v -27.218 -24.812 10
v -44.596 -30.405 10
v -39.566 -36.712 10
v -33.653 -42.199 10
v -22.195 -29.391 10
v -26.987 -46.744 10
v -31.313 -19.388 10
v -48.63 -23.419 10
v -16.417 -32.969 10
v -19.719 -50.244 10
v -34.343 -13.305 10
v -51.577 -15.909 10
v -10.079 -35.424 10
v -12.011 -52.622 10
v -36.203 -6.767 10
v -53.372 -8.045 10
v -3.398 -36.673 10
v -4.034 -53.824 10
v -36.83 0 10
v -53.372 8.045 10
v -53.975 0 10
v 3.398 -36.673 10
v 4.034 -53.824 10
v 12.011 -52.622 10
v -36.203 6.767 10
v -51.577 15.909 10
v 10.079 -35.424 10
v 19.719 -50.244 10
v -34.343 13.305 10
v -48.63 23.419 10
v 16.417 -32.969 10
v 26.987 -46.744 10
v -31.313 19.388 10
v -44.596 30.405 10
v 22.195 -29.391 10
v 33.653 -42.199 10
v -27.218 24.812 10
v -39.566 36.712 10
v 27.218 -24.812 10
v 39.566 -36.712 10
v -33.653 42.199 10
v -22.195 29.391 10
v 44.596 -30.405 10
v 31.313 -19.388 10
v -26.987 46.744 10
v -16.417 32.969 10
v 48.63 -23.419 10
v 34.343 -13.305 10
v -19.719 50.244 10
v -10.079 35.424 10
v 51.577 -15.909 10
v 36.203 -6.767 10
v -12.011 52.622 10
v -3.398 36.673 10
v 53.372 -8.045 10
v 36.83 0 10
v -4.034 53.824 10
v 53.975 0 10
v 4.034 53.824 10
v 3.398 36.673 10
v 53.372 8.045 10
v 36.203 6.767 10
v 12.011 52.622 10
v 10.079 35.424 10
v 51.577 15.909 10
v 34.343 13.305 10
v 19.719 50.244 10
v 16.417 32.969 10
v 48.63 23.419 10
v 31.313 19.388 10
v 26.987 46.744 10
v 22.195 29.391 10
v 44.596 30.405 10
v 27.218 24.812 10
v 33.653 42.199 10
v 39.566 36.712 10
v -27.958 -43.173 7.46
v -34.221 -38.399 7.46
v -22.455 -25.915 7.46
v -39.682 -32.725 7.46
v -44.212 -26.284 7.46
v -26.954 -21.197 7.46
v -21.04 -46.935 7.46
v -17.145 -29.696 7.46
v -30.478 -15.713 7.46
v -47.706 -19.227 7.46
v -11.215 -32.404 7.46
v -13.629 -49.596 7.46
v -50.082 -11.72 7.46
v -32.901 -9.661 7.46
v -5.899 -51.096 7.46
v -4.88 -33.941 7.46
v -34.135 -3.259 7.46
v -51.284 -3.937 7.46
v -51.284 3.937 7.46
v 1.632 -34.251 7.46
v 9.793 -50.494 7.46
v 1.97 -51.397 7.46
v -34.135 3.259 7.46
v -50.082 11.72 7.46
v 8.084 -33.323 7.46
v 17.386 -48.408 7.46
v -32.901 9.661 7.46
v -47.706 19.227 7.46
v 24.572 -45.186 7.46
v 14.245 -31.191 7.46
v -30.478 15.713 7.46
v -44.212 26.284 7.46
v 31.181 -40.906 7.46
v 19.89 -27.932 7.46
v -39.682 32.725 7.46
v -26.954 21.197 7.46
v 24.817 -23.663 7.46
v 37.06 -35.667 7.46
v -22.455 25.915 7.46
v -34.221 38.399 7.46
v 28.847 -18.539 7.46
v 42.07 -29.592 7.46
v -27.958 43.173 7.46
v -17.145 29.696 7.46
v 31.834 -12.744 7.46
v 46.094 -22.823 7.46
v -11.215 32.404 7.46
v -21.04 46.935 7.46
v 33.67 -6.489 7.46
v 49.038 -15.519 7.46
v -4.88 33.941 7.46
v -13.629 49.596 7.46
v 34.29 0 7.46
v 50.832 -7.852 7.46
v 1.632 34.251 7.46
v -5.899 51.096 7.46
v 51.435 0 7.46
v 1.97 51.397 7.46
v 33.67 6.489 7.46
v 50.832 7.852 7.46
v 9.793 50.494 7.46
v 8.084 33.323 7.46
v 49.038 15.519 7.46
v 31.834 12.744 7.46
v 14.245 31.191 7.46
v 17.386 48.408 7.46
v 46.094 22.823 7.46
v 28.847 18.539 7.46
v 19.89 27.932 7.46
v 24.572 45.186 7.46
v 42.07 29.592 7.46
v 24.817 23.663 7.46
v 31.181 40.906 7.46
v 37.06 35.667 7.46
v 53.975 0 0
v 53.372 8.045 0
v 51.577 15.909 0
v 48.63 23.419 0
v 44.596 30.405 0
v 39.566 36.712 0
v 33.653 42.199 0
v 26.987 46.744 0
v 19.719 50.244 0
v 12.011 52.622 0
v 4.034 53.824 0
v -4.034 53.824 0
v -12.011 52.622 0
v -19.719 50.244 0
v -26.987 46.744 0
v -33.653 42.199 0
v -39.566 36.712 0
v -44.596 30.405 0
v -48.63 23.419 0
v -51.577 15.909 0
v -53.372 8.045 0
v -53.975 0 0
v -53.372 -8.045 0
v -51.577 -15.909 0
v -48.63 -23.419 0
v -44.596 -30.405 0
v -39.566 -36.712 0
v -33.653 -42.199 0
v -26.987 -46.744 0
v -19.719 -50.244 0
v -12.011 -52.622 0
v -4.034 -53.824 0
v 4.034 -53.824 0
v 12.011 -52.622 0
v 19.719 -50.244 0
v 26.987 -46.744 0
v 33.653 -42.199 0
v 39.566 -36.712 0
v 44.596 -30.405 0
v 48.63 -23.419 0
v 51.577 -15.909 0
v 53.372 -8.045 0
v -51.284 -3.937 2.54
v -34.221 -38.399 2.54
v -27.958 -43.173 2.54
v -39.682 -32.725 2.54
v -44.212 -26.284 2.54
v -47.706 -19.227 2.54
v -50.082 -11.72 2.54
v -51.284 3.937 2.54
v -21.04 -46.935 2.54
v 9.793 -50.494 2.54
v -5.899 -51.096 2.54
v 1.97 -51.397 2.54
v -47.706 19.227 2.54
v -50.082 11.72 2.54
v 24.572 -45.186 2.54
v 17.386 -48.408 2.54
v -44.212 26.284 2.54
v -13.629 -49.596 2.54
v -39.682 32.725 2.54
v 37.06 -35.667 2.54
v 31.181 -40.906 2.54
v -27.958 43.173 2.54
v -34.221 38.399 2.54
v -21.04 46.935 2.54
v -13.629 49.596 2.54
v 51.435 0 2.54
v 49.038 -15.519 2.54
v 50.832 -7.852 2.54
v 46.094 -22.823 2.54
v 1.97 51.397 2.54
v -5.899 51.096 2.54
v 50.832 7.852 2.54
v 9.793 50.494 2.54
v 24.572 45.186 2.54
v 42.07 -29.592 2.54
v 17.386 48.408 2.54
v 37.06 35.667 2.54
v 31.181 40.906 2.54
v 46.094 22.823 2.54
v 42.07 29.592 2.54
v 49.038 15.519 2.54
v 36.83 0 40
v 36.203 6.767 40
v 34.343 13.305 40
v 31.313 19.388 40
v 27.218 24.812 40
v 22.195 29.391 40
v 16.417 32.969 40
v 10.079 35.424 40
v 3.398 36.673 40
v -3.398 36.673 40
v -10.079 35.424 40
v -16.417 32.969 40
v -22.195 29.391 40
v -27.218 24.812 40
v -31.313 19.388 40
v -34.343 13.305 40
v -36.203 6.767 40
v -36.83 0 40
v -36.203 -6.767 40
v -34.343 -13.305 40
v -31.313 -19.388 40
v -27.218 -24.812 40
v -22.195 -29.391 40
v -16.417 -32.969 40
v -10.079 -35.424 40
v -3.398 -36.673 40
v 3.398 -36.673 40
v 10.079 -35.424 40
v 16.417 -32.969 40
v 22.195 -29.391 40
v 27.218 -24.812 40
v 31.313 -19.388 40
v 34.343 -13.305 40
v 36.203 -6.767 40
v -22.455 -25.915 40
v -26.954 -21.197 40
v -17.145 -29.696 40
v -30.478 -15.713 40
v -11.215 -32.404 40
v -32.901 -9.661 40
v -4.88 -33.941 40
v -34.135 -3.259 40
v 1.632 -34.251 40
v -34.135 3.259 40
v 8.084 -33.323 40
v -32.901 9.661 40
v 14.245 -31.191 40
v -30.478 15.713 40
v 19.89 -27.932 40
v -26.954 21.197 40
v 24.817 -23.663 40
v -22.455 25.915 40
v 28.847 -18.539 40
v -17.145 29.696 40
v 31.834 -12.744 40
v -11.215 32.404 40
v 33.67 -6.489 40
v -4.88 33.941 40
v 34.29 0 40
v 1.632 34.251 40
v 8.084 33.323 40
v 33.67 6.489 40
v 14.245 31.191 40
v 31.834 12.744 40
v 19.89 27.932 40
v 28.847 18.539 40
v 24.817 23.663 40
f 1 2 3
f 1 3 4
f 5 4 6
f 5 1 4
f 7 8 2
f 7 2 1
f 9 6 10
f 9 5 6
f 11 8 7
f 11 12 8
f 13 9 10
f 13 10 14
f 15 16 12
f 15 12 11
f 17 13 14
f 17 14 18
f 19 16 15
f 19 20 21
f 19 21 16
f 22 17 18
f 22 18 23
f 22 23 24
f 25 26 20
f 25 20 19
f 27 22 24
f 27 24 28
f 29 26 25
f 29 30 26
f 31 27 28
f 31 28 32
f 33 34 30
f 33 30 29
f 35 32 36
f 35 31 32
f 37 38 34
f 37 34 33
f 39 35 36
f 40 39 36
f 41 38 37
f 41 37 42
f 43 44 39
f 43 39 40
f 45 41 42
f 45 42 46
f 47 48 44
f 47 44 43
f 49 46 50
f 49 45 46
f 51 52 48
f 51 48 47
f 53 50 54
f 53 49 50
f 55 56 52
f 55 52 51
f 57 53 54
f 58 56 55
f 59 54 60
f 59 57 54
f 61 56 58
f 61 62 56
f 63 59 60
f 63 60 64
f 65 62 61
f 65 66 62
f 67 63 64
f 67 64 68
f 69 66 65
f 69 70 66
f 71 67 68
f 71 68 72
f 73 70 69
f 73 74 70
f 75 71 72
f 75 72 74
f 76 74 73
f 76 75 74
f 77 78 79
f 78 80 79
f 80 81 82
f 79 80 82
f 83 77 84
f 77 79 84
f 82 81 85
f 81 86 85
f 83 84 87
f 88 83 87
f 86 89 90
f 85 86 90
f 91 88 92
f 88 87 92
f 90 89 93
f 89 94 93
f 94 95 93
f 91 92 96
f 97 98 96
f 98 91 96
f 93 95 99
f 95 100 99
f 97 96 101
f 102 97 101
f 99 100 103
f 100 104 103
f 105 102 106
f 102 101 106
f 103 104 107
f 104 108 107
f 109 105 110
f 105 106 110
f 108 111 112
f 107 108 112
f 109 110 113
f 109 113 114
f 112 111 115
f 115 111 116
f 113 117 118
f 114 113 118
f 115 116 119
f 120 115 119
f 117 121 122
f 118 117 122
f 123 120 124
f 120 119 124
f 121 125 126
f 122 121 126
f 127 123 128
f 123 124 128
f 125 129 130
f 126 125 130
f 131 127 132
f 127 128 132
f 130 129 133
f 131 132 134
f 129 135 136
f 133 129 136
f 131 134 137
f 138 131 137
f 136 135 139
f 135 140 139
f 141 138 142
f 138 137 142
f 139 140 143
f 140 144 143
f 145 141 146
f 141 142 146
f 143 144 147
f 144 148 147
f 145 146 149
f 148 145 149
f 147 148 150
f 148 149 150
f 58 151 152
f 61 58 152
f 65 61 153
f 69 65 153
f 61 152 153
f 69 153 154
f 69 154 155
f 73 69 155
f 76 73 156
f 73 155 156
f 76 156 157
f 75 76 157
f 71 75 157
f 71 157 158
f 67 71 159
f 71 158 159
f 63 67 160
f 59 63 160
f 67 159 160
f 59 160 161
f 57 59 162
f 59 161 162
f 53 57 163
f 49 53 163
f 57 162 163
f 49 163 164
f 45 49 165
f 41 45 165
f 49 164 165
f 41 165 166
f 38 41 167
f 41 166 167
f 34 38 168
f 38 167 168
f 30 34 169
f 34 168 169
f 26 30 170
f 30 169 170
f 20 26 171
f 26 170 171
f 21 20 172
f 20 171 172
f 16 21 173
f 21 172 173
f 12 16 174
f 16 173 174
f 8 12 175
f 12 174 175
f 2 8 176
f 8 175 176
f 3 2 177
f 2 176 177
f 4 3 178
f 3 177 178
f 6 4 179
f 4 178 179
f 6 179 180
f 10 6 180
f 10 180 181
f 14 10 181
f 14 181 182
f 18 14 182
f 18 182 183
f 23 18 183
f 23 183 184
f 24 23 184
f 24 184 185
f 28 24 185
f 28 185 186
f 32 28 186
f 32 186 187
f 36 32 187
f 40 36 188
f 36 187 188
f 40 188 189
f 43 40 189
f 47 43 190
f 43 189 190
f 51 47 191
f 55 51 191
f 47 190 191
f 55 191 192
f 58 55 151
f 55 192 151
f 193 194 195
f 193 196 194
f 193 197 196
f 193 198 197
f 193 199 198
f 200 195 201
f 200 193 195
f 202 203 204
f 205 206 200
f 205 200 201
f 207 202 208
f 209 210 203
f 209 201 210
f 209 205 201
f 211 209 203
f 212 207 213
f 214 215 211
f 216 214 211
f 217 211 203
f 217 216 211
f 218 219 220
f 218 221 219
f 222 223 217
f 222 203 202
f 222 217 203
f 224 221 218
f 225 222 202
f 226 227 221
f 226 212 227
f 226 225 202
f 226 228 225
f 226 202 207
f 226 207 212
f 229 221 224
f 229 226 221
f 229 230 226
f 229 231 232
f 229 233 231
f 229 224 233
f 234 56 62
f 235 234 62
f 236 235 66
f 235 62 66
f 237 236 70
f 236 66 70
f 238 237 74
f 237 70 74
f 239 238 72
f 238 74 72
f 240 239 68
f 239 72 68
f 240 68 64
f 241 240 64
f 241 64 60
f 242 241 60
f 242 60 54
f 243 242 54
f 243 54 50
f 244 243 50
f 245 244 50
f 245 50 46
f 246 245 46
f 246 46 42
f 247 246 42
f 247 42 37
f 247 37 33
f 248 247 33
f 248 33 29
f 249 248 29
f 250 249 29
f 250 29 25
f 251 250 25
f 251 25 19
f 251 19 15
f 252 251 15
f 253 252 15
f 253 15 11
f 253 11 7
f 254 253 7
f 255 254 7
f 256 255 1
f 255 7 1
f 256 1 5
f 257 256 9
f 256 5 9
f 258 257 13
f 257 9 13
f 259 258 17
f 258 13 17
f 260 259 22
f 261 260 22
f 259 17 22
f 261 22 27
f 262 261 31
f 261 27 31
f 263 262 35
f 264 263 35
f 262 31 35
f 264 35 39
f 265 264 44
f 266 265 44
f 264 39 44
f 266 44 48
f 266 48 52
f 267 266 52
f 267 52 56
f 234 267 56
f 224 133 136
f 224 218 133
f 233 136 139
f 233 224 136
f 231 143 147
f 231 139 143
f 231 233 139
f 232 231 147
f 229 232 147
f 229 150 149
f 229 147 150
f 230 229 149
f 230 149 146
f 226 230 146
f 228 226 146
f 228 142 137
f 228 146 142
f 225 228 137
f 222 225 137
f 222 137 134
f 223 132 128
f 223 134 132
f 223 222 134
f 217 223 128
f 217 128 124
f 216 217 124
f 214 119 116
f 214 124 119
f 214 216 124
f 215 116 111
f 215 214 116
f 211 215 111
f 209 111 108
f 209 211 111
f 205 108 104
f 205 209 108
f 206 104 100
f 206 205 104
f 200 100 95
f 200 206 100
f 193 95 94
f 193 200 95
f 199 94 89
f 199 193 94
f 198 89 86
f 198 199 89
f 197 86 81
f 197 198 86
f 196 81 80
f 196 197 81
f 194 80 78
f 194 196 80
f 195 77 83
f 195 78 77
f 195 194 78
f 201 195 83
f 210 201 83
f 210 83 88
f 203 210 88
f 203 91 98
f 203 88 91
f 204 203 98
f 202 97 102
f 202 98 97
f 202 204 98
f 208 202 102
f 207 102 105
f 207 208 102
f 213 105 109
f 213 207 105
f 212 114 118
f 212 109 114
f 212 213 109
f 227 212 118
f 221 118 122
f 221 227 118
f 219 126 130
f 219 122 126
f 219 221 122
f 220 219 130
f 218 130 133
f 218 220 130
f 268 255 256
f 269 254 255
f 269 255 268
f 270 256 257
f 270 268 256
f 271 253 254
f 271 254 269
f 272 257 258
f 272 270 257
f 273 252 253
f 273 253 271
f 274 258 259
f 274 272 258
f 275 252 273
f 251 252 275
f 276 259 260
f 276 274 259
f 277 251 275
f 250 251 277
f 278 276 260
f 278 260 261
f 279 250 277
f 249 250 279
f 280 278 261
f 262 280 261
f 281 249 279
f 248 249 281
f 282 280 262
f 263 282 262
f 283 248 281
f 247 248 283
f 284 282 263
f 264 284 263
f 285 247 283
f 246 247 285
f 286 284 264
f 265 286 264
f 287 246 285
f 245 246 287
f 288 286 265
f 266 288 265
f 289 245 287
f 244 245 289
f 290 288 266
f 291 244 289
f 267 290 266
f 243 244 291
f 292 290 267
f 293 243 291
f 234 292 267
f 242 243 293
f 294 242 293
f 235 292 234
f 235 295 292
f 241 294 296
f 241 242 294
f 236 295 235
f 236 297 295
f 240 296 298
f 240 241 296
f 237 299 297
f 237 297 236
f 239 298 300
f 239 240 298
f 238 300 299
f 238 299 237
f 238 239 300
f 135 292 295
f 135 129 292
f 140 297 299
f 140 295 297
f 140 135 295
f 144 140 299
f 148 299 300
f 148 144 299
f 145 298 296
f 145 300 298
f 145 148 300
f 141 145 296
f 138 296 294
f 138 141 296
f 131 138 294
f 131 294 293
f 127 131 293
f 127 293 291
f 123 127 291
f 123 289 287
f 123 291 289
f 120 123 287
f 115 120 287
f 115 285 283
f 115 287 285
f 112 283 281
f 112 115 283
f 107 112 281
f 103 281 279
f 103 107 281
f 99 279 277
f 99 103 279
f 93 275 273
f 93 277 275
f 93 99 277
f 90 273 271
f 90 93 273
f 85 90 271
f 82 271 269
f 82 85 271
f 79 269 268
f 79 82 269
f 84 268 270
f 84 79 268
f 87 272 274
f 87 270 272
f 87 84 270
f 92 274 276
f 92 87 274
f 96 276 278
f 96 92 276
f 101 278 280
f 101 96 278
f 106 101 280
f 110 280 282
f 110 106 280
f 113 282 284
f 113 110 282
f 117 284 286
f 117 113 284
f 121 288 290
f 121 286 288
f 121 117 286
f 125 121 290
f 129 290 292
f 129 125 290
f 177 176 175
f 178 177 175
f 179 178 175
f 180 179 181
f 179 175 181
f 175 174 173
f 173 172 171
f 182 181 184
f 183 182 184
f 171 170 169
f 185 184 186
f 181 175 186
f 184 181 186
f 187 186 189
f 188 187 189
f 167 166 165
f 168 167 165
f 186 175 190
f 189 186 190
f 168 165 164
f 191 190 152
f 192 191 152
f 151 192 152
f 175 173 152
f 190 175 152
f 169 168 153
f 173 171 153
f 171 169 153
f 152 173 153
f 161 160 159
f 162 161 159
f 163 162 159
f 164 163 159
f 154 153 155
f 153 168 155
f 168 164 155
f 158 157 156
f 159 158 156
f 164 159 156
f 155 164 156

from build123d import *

# Parameters (mm, degrees)
F1_R     = 53.975
F3_DEPTH = 10
F0_R     = 36.83
F4_DEPTH = 40
F5_T     = -2.54


with BuildPart() as f3:
    # F1 (on Top) → F3 (new body)
    with BuildSketch(Plane.XY):
        Circle(F1_R)
    extrude(amount=F3_DEPTH)

    # F0 (on Top) → F4 (join)
    with BuildSketch(Plane.XY):
        Circle(F0_R)
    extrude(amount=F4_DEPTH)

    # F5
    f5_openings = [f3.faces().sort_by_distance(p)[0] for p in [
        (0, 0, 40),
    ]]
    offset(amount=F5_T, openings=f5_openings, kind=Kind.INTERSECTION)


solid = f3.part
